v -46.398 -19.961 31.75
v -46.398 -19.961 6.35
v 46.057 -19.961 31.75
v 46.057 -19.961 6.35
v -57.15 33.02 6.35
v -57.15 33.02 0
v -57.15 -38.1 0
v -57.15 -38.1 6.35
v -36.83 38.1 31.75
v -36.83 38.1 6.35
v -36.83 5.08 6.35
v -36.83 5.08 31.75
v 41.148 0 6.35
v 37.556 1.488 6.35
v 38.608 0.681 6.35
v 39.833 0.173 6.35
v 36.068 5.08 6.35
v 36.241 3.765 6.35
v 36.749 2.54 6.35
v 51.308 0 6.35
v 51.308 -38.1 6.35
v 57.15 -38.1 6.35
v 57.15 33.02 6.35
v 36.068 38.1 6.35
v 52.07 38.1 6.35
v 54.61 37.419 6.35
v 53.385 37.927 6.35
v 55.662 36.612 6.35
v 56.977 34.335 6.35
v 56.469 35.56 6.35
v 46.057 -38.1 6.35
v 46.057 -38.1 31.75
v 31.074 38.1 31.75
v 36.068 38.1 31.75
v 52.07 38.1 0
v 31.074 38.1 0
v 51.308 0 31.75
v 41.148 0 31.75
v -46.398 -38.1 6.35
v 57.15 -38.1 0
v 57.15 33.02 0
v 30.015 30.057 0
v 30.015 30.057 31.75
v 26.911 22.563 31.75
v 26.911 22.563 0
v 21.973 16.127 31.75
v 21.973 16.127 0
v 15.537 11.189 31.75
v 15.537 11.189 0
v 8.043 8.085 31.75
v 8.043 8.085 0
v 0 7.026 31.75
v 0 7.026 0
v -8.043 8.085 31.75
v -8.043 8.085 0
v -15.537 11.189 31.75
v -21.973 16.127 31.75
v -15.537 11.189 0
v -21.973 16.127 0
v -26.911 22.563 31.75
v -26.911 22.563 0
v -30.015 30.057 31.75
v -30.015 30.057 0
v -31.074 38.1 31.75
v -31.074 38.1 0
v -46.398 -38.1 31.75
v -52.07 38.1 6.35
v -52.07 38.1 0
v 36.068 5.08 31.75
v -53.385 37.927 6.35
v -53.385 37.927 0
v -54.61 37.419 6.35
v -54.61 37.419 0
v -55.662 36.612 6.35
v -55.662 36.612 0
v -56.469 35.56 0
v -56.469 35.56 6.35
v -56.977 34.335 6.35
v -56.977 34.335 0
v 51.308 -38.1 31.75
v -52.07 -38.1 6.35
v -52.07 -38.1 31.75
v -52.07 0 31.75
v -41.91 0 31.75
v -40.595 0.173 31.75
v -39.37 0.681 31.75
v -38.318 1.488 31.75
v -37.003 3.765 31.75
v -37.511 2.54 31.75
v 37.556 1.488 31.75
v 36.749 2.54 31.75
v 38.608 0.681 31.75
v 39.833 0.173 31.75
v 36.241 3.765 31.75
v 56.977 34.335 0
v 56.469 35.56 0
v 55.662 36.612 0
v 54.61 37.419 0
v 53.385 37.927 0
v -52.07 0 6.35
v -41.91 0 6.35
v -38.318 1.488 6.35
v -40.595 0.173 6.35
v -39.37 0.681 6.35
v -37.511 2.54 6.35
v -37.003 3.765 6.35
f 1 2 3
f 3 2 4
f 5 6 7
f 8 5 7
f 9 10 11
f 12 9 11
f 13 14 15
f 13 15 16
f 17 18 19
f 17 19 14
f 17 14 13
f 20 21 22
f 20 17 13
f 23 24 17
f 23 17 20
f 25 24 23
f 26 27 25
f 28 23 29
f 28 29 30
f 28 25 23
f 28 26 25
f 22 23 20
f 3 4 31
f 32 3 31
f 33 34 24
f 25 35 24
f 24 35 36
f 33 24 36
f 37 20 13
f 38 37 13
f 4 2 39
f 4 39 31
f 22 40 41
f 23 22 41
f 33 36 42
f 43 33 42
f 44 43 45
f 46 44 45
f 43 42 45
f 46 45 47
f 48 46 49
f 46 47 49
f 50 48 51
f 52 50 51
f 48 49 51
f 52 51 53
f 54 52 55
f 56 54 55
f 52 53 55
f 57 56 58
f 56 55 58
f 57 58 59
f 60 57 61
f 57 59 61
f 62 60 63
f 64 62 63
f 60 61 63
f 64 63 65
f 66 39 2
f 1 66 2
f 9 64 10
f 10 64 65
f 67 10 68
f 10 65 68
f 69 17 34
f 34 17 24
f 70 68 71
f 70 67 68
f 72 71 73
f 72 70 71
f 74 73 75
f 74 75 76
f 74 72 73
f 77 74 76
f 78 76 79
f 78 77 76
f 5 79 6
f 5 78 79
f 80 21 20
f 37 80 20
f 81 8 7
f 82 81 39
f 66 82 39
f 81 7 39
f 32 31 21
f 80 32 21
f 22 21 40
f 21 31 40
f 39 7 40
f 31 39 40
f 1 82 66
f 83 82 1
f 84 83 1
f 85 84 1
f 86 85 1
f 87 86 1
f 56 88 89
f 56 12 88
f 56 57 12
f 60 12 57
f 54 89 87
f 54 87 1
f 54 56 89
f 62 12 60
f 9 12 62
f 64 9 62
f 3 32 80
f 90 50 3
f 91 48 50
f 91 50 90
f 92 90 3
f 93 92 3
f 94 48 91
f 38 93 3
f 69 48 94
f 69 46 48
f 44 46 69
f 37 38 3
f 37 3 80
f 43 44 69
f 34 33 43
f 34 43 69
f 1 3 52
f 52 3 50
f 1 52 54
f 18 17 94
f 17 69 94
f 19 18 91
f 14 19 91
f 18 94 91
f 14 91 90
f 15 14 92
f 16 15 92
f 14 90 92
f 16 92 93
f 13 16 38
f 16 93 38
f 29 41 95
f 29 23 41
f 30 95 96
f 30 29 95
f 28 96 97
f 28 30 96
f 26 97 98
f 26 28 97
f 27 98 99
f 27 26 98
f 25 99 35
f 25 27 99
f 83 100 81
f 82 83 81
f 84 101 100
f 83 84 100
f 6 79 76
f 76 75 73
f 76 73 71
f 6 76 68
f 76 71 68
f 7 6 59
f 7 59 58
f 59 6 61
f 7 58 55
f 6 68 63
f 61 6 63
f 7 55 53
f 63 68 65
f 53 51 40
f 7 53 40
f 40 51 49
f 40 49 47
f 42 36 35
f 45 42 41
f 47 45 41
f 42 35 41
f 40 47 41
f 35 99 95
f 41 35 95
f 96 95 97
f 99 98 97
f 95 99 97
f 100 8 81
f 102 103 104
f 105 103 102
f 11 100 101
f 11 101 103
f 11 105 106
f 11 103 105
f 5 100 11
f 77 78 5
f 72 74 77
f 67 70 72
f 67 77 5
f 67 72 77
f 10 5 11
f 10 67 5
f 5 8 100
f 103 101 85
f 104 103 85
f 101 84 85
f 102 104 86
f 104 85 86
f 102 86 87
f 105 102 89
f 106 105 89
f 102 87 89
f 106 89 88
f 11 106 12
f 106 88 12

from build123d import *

# Parameters (mm, degrees)
F1_DEPTH = 6.35
F2_R     = 5.08
F4_DEPTH = 25.4
F5_R     = 5.08


with BuildPart() as f1:
    # F0 (on Top) → F1 (new body)
    with BuildSketch(Plane.XY):
        with BuildLine():
            Line((-31.073933, 38.1), (-57.15, 38.1))
            Line((-57.15, 38.1), (-57.15, -38.1))
            Line((-57.15, -38.1), (57.15, -38.1))
            Line((57.15, -38.1), (57.15, 38.1))
            Line((57.15, 38.1), (31.073933, 38.1))
            ThreePointArc((31.073933, 38.1), (0, 7.026067), (-31.073933, 38.1))
        make_face()
    extrude(amount=F1_DEPTH)

    # F2
    f2_edges = [f1.edges().sort_by_distance(p)[0] for p in [
        (-57.15, 38.1, 3.175),
        (57.15, 38.1, 3.175),
    ]]
    fillet(f2_edges, radius=F2_R)

    # F3 (on face) → F4 (join)
    with BuildSketch(Plane.XY.offset(6.35)):
        with BuildLine():
            Line((-31.073933, 38.1), (-36.83, 38.1))
            Line((-36.83, 38.1), (-36.83, 0))
            Line((-36.83, 0), (-52.07, 0))
            Line((-52.07, 0), (-52.07, -38.1))
            Line((-52.07, -38.1), (-46.398055, -38.1))
            Line((-46.398055, -38.1), (-46.398055, -19.961452))
            Line((-46.398055, -19.961452), (46.057381, -19.961452))
            Line((46.057381, -19.961452), (46.057381, -38.1))
            Line((46.057381, -38.1), (51.308, -38.1))
            Line((51.308, -38.1), (51.308, 0))
            Line((51.308, 0), (36.068, 0))
            Line((36.068, 0), (36.068, 38.1))
            Line((36.068, 38.1), (31.073933, 38.1))
            ThreePointArc((31.073933, 38.1), (0, 7.026067), (-31.073933, 38.1))
        make_face()
    extrude(amount=F4_DEPTH)

    # F5
    f5_edges = [f1.edges().sort_by_distance(p)[0] for p in [
        (36.068, 0, 19.05),
        (-36.83, 0, 19.05),
    ]]
    fillet(f5_edges, radius=F5_R)


solid = f1.part
